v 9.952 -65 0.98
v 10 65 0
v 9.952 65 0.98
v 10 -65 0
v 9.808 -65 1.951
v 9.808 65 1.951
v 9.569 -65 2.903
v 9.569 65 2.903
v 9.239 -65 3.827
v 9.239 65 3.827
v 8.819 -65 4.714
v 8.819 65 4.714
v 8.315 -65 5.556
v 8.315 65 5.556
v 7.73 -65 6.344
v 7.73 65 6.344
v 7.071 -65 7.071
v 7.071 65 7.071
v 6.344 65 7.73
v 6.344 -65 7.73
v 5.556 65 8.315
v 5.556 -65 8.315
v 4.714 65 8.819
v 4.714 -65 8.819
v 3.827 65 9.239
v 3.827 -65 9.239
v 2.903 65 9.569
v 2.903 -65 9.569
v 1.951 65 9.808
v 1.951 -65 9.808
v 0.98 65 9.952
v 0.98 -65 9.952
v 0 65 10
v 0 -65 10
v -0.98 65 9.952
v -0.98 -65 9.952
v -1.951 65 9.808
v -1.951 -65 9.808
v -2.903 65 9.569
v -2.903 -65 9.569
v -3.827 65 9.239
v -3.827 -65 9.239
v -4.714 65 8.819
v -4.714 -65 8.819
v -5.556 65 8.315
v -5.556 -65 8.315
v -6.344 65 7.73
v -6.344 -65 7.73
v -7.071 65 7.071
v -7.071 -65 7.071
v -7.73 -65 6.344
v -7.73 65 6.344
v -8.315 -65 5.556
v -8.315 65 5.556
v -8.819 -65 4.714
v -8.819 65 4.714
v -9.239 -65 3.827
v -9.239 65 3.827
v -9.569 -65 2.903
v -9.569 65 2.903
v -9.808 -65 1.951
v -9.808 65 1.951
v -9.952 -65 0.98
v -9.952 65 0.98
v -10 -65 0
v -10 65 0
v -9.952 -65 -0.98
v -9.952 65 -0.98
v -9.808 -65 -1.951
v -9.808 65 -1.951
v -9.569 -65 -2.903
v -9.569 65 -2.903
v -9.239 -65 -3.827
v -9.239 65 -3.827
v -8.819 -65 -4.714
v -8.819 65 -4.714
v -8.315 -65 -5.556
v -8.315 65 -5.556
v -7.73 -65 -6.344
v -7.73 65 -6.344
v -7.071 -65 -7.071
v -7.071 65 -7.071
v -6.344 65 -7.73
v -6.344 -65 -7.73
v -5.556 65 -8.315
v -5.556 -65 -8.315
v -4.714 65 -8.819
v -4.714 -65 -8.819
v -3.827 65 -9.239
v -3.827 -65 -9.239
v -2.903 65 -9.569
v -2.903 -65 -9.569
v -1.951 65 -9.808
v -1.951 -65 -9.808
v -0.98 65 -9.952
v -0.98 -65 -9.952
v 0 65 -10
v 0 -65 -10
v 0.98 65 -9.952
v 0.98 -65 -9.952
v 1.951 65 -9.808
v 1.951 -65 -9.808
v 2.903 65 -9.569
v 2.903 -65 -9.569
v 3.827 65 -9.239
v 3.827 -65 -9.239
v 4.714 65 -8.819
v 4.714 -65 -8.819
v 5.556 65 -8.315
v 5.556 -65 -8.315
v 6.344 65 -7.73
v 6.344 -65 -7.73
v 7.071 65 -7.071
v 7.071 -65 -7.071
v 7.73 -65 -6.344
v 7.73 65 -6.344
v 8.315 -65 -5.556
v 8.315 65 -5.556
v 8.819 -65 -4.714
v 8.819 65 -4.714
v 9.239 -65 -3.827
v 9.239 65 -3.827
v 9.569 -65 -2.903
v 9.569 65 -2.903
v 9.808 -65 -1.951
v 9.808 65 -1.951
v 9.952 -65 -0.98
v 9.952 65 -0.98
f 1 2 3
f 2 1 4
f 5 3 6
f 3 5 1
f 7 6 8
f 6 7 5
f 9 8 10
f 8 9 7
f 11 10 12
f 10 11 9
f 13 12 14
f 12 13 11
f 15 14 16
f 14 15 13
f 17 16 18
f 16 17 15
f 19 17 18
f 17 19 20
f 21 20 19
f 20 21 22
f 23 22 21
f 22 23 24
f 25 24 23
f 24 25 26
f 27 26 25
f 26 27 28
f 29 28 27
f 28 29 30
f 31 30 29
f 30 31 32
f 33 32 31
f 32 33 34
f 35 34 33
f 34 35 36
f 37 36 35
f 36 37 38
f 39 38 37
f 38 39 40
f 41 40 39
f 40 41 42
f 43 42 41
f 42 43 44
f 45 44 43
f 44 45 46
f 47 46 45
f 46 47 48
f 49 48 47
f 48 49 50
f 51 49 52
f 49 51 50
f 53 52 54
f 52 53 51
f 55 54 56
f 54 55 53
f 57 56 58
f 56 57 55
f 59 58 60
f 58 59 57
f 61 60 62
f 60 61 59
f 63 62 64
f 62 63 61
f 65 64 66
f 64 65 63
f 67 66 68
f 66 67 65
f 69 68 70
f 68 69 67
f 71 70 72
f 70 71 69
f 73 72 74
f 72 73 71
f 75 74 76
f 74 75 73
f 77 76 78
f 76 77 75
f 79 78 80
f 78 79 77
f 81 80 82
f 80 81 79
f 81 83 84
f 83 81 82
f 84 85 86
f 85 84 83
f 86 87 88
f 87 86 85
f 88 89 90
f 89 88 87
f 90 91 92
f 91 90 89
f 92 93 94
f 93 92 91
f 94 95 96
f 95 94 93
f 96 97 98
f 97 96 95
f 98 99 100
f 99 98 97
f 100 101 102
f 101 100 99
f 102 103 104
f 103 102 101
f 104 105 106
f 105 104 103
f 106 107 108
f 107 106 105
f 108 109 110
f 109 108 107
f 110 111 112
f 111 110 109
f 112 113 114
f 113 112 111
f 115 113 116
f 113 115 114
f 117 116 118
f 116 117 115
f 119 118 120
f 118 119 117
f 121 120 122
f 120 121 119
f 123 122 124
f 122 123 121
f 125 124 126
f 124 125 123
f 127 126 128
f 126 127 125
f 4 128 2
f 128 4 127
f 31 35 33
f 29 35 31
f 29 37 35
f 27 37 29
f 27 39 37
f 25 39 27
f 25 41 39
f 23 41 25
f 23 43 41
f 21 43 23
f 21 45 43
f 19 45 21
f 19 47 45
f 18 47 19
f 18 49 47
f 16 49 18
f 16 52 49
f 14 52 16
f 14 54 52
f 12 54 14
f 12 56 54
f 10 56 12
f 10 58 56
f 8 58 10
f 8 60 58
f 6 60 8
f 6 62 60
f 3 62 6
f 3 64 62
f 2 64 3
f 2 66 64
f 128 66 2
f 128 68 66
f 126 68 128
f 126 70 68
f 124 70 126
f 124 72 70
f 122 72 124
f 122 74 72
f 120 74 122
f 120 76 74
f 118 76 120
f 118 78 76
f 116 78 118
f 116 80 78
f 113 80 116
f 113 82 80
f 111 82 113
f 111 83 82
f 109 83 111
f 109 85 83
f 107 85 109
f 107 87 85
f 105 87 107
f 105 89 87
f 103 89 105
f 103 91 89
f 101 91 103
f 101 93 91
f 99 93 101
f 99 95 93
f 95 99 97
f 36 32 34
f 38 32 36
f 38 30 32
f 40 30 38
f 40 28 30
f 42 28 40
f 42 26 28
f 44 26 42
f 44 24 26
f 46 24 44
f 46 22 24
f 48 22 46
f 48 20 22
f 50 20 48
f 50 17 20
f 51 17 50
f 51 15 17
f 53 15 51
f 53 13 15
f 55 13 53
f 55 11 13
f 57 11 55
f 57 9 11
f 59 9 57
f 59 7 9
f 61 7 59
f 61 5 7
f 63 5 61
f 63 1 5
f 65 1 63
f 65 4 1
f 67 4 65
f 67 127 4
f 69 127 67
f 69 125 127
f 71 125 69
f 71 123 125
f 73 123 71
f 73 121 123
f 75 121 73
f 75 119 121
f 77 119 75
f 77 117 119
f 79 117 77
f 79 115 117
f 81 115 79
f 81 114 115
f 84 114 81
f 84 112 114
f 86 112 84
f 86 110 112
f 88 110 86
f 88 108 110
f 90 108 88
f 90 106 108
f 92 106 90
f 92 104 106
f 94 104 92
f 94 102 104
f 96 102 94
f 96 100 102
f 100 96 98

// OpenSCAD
// file: ../config/parameters.scad
// Global Chassis Dimensions
chassis_width = 720; //kies een veelvoud van 80  
chassis_length = 1040; //kies een veelvoud van 80

// --- Modulair Gatenpatroon (Grid) ---
grid_step = 40; // Universele stapgrootte voor alle gaten

// --- Bereiken (Ranges) voor de Robot Afmetingen ---
// Bereik voor de BREEDTE 
chassis_width_min = 560;
chassis_width_max = 800;
chassis_width_step = 80; // Stapgrootte voor instelbare breedte

// Bereik voor de LENGTE 
chassis_length_min = 720;
chassis_length_max = 1040;
chassis_length_step = 80; // Stapgrootte voor instelbare lengte

// Bereik voor de BASE PLATE 
base_length_min = 800;
base_length_max = 1280;
base_length_step = 80;

// Beam Profile (Purchased Part)
beam_profile = 40;
beam_thickness = 3;    
beam_length_1 = 1000;
beam_length_2 = 1280;

// Upright & Cover
base_plate_length = 1300;
connect_plate_thick = 5; 
upright_height = 500;
top_side_width = 60;
cover_thick = 5;
cover_clearance = 10;  
cover_overlap = 10;
cover_total_height = 530; 
hole_distance_cover = 30;

// Resolution & Preview
$fn = 60; 
exploded_view = false; 
explosion_dist = 800; 

// Motor & Wheel Data
tire_dia = 430;
tire_width = 100;
hub_dia = 160;
hub_width = 140; //specs from Quinder are: Fork width for mounting: 138mm
axle_dia = 10.2; //specs from Quinder are: Mounting hole: max 10.2mm
bolt_dia = 14.2;

// Bracket Geometry universal
bracket_thick = 5;
bracket_bolt_diameter = 10.4; //dikte van de gaten van gaten van de wiel_bracket     
tire_clearance = 130;      
side_plate_top_width = 240;
side_plate_width = 240;

//Side plate
axle_bottom_dist = 35;
extra_space_bracket = 40;
side_hole_start_from_bottom = 20; 
side_hole_pitch = 100; 

tab_length = 40;         // Lengte van de nok/sleuf
tab_offset_y = 40;       // Positie vanaf het midden over de Y-as (uit elkaar)
laser_tolerance = 0.5;   // Extra snijspeling zodat het makkelijk in elkaar schuift

//top plate
bracket_top_hole_dist_x = 80; // De totale gewenste afstand over de X-as
bracket_top_hole_dist_y = 120; // De totale gewenste afstand over de Y-as


arm_height = (tire_dia / 2) + tire_clearance;
inner_width = hub_width;
bracket_total_width = inner_width + (extra_space_bracket*2) + (2 * bracket_thick);
bracket_top_z = arm_height + bracket_thick;

// Axle bracket
axle_hex_width = 85;          
axle_hex_height = 40;
axle_hex_straight_part = 30;   
axle_bracket_thickness = 5;    

axle_hole_diameter = 10.3; //Dikte van het gaten in de axle_bracket
axle_hole_distance = 30; //hoogte vanaf de onderkant tot de wiel ophanging

axle_flat_width = axle_dia; // Gebruikt 10.2 uit parameters 
axle_round_dia = bolt_dia;  // Gebruikt 14.2 uit parameters

// --- Caster Wheel Parameters ---  
bracket_width            = 80;  
bracket_thickness        = 5;
caster_wheel_axle_width  = 130;   
caster_wheel_axle_diameter = 20;
bracket_axle_hole_diameter = 10.4;

pivot_cylinder_dia       = 30;  
pivot_cylinder_height    = 100;  

outer_cylinder_thickness = 5;   
outer_cylinder_height    = 60;  
outer_cylinder_z_offset  = 33;   
kap_speling              = 1;   

tube_width               = 35;  
tube_thickness           = 2;   
tube_length              = 400;
tube_length_min          = 240;
// main file
include <../config/parameters.scad>

module caster_wheel_axle() {
    color("silver") {
        rotate([90, 0, 0]) {
            cylinder(
                h = caster_wheel_axle_width, 
                d = caster_wheel_axle_diameter, 
                center = true, 
                $fn = 64 // Zorgt voor een mooie, gladde ronde cilinder
            );
        }
    }
}

caster_wheel_axle();
